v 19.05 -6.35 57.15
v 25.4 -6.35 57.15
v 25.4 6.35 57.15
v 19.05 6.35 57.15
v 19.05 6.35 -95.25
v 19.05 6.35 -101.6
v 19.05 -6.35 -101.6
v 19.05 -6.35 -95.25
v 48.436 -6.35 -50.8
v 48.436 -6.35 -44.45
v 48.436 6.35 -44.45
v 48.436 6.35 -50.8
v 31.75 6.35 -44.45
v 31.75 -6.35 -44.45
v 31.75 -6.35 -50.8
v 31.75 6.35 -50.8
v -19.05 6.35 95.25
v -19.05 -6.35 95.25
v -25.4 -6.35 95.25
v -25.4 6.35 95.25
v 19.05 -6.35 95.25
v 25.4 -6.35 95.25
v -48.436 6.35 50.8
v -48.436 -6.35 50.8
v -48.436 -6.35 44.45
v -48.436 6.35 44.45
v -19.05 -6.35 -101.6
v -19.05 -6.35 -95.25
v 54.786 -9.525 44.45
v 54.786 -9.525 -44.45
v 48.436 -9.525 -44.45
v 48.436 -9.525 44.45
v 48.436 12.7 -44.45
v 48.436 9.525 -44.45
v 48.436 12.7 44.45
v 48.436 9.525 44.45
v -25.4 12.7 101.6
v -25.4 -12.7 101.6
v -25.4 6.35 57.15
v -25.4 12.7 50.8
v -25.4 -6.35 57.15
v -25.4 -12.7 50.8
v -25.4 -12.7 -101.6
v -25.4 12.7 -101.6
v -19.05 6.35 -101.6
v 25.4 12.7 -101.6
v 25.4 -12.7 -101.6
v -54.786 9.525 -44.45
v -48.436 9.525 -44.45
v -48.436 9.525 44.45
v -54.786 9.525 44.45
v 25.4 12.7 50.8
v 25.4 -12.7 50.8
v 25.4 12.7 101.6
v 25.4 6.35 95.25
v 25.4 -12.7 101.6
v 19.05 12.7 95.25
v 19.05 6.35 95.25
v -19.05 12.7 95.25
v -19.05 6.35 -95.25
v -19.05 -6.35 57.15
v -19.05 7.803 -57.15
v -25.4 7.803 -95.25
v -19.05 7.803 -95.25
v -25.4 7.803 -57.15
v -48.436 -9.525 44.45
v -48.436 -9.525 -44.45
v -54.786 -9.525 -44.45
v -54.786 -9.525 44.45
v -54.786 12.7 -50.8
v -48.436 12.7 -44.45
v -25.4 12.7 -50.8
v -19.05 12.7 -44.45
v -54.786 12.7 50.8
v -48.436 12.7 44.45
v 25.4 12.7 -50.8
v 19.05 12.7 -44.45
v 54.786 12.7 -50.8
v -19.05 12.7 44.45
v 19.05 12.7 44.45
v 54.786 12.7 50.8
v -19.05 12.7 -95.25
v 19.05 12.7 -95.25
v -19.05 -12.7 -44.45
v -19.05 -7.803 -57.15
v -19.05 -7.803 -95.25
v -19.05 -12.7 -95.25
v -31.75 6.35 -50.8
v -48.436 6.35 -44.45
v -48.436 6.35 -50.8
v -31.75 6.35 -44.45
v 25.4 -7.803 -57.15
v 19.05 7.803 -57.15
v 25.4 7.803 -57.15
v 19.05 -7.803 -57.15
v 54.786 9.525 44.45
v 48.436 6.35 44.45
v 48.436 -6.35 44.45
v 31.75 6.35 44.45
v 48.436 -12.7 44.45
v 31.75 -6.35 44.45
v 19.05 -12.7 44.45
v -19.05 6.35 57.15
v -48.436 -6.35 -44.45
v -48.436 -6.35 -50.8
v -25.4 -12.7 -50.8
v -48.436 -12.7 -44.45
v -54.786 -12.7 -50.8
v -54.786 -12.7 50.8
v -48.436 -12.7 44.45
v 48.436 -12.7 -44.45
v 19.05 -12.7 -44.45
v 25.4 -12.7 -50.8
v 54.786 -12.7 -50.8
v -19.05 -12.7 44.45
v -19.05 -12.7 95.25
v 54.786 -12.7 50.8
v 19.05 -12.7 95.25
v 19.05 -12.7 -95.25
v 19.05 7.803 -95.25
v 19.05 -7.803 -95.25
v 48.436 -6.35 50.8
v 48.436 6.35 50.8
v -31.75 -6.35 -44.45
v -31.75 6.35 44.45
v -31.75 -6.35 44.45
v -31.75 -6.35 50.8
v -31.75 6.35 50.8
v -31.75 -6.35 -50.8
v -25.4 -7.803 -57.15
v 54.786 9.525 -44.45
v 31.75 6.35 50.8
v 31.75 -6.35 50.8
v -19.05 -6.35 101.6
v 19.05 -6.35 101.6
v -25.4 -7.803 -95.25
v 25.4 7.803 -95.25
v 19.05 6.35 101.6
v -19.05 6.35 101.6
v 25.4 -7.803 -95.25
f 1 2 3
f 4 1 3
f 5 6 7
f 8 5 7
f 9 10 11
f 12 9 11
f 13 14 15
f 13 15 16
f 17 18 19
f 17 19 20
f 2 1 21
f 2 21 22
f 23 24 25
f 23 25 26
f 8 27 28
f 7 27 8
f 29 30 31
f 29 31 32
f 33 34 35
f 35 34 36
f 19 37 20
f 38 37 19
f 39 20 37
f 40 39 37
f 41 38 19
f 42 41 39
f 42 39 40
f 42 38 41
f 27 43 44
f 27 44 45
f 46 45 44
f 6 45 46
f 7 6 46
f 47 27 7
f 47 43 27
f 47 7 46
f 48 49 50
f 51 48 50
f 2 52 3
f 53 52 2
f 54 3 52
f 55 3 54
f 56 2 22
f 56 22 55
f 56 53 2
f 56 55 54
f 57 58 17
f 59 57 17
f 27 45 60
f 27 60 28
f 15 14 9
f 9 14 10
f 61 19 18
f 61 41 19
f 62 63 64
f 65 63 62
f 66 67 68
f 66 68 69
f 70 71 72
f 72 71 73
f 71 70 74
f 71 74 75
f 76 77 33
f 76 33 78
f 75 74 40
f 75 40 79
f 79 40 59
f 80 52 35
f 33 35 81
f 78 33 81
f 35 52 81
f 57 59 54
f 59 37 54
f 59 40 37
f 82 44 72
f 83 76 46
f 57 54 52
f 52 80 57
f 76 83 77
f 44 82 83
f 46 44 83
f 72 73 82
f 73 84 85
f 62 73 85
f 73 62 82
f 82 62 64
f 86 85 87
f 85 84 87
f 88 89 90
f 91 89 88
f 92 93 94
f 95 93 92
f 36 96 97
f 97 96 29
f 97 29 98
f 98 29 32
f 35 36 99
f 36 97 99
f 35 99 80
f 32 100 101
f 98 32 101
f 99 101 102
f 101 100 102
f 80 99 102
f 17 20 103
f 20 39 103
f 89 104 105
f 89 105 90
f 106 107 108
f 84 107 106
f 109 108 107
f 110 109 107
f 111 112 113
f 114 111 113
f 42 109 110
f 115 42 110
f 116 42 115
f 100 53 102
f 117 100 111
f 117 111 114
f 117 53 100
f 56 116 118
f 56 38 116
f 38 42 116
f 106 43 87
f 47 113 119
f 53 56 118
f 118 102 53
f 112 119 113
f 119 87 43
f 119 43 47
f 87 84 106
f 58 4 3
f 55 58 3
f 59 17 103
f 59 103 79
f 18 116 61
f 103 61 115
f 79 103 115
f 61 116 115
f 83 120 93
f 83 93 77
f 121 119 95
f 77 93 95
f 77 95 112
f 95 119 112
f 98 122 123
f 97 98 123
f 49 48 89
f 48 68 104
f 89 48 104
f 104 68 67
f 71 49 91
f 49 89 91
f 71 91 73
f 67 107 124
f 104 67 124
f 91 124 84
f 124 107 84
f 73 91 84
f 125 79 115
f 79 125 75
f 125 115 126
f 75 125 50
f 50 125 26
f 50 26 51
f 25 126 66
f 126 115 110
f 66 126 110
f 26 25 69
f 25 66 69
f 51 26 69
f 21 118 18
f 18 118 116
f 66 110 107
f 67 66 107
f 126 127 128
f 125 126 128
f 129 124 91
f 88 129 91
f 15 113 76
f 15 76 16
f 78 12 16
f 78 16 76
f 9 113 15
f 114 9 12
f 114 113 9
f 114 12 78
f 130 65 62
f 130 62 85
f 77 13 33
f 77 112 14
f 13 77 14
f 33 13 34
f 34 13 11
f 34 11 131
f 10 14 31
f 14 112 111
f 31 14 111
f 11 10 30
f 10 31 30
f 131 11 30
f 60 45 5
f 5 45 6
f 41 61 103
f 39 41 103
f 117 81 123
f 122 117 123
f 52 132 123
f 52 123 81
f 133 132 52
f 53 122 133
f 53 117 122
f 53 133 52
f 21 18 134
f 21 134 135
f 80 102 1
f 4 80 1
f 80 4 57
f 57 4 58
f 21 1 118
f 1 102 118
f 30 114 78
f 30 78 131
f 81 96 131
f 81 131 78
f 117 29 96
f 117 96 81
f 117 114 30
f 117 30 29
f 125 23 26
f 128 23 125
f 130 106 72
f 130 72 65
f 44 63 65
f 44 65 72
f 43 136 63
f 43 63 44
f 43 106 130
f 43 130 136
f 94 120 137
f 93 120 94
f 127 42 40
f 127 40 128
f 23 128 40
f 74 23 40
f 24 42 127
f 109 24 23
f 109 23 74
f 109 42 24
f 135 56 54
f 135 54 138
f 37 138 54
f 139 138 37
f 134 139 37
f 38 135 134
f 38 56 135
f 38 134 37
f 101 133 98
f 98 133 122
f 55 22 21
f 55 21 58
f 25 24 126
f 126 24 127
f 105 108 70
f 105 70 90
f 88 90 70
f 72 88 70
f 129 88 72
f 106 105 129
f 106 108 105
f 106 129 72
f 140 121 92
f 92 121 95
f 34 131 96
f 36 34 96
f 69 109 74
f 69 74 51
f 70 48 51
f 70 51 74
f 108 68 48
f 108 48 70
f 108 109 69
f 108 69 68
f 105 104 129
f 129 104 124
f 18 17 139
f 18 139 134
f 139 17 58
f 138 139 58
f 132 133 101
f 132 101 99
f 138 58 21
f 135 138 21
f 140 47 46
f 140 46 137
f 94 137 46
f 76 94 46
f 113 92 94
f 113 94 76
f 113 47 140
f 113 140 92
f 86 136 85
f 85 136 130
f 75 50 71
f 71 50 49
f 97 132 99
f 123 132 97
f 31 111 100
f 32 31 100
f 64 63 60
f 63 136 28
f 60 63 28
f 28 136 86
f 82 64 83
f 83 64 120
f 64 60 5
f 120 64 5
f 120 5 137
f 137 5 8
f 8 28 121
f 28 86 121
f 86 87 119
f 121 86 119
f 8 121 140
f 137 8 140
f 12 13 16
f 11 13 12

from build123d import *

# Parameters (mm, degrees)
F1_DEPTH  = 12.7
F2_W      = 19.05
F2_H      = 88.9
F3_DEPTH  = 109.573695
F4_W      = 38.1
F4_H      = 12.7
F5_DEPTH  = 203.201
F6_W      = 12.7
F6_H      = 38.1
F7_DEPTH  = 80.187348
F8_W      = 15.60564
F8_H      = 38.1
F9_DEPTH  = 80.187348
F11_DEPTH = 25.401
F12_W     = 16.686348
F12_H     = 12.7
F13_DEPTH = 152.401
F14_W     = 16.686348
F14_H     = 12.7
F15_DEPTH = 152.401


with BuildPart() as f1:
    # F0 (on Front) → F1 (new body, symmetric)
    with BuildSketch(Plane.XZ):
        Polygon((25.4, 101.6), (0, 101.6), (-25.4, 101.6), (-25.4, 50.8), (-54.786348, 50.8), (-54.786348, -50.8), (-25.4, -50.8), (-25.4, -101.6), (0, -101.6), (25.4, -101.6), (25.4, -50.8), (54.786348, -50.8), (54.786348, 50.8), (25.4, 50.8), align=None)
    extrude(amount=F1_DEPTH, both=True)

    # F2 (on face) → F3 (cut, through all)
    with BuildSketch(Plane.YZ.offset(54.786348)):
        Rectangle(F2_W, F2_H)
    extrude(amount=-F3_DEPTH, mode=Mode.SUBTRACT)

    # F4 (on face) → F5 (cut, through all)
    with BuildSketch(Plane(origin=(0, 0, -101.6), x_dir=(1, 0, 0), z_dir=(0, 0, -1))):
        Rectangle(F4_W, F4_H)
    extrude(amount=-F5_DEPTH, mode=Mode.SUBTRACT)

    # F6 (on face) → F7 (cut, through all)
    with BuildSketch(Plane.YZ.offset(25.4)):
        with Locations((0, 76.2)):
            Rectangle(F6_W, F6_H)
    extrude(amount=-F7_DEPTH, mode=Mode.SUBTRACT)

    # F8 (on face) → F9 (cut, through all)
    with BuildSketch(Plane(origin=(-25.4, 0, 0), x_dir=(0, -1, 0), z_dir=(-1, 0, 0))):
        with Locations((0, -76.2)):
            Rectangle(F8_W, F8_H)
    extrude(amount=-F9_DEPTH, mode=Mode.SUBTRACT)

    # F10 (on face) → F11 (cut, through all)
    with BuildSketch(Plane.XZ.offset(12.7)):
        Polygon((19.05, 95.25), (-19.05, 95.25), (-19.05, 44.45), (-48.436348, 44.45), (-48.436348, -44.45), (-19.05, -44.45), (-19.05, -95.25), (19.05, -95.25), (19.05, -44.45), (48.436348, -44.45), (48.436348, 44.45), (19.05, 44.45), align=None)
    extrude(amount=-F11_DEPTH, mode=Mode.SUBTRACT)

    # F12 (on face) → F13 (cut, through all)
    with BuildSketch(Plane.XY.offset(50.8)):
        with Locations((-40.093174, 0)):
            Rectangle(F12_W, F12_H)
    extrude(amount=-F13_DEPTH, mode=Mode.SUBTRACT)

    # F14 (on face) → F15 (cut, through all)
    with BuildSketch(Plane.XY.offset(50.8)):
        with Locations((40.093174, 0)):
            Rectangle(F14_W, F14_H)
    extrude(amount=-F15_DEPTH, mode=Mode.SUBTRACT)


solid = f1.part
